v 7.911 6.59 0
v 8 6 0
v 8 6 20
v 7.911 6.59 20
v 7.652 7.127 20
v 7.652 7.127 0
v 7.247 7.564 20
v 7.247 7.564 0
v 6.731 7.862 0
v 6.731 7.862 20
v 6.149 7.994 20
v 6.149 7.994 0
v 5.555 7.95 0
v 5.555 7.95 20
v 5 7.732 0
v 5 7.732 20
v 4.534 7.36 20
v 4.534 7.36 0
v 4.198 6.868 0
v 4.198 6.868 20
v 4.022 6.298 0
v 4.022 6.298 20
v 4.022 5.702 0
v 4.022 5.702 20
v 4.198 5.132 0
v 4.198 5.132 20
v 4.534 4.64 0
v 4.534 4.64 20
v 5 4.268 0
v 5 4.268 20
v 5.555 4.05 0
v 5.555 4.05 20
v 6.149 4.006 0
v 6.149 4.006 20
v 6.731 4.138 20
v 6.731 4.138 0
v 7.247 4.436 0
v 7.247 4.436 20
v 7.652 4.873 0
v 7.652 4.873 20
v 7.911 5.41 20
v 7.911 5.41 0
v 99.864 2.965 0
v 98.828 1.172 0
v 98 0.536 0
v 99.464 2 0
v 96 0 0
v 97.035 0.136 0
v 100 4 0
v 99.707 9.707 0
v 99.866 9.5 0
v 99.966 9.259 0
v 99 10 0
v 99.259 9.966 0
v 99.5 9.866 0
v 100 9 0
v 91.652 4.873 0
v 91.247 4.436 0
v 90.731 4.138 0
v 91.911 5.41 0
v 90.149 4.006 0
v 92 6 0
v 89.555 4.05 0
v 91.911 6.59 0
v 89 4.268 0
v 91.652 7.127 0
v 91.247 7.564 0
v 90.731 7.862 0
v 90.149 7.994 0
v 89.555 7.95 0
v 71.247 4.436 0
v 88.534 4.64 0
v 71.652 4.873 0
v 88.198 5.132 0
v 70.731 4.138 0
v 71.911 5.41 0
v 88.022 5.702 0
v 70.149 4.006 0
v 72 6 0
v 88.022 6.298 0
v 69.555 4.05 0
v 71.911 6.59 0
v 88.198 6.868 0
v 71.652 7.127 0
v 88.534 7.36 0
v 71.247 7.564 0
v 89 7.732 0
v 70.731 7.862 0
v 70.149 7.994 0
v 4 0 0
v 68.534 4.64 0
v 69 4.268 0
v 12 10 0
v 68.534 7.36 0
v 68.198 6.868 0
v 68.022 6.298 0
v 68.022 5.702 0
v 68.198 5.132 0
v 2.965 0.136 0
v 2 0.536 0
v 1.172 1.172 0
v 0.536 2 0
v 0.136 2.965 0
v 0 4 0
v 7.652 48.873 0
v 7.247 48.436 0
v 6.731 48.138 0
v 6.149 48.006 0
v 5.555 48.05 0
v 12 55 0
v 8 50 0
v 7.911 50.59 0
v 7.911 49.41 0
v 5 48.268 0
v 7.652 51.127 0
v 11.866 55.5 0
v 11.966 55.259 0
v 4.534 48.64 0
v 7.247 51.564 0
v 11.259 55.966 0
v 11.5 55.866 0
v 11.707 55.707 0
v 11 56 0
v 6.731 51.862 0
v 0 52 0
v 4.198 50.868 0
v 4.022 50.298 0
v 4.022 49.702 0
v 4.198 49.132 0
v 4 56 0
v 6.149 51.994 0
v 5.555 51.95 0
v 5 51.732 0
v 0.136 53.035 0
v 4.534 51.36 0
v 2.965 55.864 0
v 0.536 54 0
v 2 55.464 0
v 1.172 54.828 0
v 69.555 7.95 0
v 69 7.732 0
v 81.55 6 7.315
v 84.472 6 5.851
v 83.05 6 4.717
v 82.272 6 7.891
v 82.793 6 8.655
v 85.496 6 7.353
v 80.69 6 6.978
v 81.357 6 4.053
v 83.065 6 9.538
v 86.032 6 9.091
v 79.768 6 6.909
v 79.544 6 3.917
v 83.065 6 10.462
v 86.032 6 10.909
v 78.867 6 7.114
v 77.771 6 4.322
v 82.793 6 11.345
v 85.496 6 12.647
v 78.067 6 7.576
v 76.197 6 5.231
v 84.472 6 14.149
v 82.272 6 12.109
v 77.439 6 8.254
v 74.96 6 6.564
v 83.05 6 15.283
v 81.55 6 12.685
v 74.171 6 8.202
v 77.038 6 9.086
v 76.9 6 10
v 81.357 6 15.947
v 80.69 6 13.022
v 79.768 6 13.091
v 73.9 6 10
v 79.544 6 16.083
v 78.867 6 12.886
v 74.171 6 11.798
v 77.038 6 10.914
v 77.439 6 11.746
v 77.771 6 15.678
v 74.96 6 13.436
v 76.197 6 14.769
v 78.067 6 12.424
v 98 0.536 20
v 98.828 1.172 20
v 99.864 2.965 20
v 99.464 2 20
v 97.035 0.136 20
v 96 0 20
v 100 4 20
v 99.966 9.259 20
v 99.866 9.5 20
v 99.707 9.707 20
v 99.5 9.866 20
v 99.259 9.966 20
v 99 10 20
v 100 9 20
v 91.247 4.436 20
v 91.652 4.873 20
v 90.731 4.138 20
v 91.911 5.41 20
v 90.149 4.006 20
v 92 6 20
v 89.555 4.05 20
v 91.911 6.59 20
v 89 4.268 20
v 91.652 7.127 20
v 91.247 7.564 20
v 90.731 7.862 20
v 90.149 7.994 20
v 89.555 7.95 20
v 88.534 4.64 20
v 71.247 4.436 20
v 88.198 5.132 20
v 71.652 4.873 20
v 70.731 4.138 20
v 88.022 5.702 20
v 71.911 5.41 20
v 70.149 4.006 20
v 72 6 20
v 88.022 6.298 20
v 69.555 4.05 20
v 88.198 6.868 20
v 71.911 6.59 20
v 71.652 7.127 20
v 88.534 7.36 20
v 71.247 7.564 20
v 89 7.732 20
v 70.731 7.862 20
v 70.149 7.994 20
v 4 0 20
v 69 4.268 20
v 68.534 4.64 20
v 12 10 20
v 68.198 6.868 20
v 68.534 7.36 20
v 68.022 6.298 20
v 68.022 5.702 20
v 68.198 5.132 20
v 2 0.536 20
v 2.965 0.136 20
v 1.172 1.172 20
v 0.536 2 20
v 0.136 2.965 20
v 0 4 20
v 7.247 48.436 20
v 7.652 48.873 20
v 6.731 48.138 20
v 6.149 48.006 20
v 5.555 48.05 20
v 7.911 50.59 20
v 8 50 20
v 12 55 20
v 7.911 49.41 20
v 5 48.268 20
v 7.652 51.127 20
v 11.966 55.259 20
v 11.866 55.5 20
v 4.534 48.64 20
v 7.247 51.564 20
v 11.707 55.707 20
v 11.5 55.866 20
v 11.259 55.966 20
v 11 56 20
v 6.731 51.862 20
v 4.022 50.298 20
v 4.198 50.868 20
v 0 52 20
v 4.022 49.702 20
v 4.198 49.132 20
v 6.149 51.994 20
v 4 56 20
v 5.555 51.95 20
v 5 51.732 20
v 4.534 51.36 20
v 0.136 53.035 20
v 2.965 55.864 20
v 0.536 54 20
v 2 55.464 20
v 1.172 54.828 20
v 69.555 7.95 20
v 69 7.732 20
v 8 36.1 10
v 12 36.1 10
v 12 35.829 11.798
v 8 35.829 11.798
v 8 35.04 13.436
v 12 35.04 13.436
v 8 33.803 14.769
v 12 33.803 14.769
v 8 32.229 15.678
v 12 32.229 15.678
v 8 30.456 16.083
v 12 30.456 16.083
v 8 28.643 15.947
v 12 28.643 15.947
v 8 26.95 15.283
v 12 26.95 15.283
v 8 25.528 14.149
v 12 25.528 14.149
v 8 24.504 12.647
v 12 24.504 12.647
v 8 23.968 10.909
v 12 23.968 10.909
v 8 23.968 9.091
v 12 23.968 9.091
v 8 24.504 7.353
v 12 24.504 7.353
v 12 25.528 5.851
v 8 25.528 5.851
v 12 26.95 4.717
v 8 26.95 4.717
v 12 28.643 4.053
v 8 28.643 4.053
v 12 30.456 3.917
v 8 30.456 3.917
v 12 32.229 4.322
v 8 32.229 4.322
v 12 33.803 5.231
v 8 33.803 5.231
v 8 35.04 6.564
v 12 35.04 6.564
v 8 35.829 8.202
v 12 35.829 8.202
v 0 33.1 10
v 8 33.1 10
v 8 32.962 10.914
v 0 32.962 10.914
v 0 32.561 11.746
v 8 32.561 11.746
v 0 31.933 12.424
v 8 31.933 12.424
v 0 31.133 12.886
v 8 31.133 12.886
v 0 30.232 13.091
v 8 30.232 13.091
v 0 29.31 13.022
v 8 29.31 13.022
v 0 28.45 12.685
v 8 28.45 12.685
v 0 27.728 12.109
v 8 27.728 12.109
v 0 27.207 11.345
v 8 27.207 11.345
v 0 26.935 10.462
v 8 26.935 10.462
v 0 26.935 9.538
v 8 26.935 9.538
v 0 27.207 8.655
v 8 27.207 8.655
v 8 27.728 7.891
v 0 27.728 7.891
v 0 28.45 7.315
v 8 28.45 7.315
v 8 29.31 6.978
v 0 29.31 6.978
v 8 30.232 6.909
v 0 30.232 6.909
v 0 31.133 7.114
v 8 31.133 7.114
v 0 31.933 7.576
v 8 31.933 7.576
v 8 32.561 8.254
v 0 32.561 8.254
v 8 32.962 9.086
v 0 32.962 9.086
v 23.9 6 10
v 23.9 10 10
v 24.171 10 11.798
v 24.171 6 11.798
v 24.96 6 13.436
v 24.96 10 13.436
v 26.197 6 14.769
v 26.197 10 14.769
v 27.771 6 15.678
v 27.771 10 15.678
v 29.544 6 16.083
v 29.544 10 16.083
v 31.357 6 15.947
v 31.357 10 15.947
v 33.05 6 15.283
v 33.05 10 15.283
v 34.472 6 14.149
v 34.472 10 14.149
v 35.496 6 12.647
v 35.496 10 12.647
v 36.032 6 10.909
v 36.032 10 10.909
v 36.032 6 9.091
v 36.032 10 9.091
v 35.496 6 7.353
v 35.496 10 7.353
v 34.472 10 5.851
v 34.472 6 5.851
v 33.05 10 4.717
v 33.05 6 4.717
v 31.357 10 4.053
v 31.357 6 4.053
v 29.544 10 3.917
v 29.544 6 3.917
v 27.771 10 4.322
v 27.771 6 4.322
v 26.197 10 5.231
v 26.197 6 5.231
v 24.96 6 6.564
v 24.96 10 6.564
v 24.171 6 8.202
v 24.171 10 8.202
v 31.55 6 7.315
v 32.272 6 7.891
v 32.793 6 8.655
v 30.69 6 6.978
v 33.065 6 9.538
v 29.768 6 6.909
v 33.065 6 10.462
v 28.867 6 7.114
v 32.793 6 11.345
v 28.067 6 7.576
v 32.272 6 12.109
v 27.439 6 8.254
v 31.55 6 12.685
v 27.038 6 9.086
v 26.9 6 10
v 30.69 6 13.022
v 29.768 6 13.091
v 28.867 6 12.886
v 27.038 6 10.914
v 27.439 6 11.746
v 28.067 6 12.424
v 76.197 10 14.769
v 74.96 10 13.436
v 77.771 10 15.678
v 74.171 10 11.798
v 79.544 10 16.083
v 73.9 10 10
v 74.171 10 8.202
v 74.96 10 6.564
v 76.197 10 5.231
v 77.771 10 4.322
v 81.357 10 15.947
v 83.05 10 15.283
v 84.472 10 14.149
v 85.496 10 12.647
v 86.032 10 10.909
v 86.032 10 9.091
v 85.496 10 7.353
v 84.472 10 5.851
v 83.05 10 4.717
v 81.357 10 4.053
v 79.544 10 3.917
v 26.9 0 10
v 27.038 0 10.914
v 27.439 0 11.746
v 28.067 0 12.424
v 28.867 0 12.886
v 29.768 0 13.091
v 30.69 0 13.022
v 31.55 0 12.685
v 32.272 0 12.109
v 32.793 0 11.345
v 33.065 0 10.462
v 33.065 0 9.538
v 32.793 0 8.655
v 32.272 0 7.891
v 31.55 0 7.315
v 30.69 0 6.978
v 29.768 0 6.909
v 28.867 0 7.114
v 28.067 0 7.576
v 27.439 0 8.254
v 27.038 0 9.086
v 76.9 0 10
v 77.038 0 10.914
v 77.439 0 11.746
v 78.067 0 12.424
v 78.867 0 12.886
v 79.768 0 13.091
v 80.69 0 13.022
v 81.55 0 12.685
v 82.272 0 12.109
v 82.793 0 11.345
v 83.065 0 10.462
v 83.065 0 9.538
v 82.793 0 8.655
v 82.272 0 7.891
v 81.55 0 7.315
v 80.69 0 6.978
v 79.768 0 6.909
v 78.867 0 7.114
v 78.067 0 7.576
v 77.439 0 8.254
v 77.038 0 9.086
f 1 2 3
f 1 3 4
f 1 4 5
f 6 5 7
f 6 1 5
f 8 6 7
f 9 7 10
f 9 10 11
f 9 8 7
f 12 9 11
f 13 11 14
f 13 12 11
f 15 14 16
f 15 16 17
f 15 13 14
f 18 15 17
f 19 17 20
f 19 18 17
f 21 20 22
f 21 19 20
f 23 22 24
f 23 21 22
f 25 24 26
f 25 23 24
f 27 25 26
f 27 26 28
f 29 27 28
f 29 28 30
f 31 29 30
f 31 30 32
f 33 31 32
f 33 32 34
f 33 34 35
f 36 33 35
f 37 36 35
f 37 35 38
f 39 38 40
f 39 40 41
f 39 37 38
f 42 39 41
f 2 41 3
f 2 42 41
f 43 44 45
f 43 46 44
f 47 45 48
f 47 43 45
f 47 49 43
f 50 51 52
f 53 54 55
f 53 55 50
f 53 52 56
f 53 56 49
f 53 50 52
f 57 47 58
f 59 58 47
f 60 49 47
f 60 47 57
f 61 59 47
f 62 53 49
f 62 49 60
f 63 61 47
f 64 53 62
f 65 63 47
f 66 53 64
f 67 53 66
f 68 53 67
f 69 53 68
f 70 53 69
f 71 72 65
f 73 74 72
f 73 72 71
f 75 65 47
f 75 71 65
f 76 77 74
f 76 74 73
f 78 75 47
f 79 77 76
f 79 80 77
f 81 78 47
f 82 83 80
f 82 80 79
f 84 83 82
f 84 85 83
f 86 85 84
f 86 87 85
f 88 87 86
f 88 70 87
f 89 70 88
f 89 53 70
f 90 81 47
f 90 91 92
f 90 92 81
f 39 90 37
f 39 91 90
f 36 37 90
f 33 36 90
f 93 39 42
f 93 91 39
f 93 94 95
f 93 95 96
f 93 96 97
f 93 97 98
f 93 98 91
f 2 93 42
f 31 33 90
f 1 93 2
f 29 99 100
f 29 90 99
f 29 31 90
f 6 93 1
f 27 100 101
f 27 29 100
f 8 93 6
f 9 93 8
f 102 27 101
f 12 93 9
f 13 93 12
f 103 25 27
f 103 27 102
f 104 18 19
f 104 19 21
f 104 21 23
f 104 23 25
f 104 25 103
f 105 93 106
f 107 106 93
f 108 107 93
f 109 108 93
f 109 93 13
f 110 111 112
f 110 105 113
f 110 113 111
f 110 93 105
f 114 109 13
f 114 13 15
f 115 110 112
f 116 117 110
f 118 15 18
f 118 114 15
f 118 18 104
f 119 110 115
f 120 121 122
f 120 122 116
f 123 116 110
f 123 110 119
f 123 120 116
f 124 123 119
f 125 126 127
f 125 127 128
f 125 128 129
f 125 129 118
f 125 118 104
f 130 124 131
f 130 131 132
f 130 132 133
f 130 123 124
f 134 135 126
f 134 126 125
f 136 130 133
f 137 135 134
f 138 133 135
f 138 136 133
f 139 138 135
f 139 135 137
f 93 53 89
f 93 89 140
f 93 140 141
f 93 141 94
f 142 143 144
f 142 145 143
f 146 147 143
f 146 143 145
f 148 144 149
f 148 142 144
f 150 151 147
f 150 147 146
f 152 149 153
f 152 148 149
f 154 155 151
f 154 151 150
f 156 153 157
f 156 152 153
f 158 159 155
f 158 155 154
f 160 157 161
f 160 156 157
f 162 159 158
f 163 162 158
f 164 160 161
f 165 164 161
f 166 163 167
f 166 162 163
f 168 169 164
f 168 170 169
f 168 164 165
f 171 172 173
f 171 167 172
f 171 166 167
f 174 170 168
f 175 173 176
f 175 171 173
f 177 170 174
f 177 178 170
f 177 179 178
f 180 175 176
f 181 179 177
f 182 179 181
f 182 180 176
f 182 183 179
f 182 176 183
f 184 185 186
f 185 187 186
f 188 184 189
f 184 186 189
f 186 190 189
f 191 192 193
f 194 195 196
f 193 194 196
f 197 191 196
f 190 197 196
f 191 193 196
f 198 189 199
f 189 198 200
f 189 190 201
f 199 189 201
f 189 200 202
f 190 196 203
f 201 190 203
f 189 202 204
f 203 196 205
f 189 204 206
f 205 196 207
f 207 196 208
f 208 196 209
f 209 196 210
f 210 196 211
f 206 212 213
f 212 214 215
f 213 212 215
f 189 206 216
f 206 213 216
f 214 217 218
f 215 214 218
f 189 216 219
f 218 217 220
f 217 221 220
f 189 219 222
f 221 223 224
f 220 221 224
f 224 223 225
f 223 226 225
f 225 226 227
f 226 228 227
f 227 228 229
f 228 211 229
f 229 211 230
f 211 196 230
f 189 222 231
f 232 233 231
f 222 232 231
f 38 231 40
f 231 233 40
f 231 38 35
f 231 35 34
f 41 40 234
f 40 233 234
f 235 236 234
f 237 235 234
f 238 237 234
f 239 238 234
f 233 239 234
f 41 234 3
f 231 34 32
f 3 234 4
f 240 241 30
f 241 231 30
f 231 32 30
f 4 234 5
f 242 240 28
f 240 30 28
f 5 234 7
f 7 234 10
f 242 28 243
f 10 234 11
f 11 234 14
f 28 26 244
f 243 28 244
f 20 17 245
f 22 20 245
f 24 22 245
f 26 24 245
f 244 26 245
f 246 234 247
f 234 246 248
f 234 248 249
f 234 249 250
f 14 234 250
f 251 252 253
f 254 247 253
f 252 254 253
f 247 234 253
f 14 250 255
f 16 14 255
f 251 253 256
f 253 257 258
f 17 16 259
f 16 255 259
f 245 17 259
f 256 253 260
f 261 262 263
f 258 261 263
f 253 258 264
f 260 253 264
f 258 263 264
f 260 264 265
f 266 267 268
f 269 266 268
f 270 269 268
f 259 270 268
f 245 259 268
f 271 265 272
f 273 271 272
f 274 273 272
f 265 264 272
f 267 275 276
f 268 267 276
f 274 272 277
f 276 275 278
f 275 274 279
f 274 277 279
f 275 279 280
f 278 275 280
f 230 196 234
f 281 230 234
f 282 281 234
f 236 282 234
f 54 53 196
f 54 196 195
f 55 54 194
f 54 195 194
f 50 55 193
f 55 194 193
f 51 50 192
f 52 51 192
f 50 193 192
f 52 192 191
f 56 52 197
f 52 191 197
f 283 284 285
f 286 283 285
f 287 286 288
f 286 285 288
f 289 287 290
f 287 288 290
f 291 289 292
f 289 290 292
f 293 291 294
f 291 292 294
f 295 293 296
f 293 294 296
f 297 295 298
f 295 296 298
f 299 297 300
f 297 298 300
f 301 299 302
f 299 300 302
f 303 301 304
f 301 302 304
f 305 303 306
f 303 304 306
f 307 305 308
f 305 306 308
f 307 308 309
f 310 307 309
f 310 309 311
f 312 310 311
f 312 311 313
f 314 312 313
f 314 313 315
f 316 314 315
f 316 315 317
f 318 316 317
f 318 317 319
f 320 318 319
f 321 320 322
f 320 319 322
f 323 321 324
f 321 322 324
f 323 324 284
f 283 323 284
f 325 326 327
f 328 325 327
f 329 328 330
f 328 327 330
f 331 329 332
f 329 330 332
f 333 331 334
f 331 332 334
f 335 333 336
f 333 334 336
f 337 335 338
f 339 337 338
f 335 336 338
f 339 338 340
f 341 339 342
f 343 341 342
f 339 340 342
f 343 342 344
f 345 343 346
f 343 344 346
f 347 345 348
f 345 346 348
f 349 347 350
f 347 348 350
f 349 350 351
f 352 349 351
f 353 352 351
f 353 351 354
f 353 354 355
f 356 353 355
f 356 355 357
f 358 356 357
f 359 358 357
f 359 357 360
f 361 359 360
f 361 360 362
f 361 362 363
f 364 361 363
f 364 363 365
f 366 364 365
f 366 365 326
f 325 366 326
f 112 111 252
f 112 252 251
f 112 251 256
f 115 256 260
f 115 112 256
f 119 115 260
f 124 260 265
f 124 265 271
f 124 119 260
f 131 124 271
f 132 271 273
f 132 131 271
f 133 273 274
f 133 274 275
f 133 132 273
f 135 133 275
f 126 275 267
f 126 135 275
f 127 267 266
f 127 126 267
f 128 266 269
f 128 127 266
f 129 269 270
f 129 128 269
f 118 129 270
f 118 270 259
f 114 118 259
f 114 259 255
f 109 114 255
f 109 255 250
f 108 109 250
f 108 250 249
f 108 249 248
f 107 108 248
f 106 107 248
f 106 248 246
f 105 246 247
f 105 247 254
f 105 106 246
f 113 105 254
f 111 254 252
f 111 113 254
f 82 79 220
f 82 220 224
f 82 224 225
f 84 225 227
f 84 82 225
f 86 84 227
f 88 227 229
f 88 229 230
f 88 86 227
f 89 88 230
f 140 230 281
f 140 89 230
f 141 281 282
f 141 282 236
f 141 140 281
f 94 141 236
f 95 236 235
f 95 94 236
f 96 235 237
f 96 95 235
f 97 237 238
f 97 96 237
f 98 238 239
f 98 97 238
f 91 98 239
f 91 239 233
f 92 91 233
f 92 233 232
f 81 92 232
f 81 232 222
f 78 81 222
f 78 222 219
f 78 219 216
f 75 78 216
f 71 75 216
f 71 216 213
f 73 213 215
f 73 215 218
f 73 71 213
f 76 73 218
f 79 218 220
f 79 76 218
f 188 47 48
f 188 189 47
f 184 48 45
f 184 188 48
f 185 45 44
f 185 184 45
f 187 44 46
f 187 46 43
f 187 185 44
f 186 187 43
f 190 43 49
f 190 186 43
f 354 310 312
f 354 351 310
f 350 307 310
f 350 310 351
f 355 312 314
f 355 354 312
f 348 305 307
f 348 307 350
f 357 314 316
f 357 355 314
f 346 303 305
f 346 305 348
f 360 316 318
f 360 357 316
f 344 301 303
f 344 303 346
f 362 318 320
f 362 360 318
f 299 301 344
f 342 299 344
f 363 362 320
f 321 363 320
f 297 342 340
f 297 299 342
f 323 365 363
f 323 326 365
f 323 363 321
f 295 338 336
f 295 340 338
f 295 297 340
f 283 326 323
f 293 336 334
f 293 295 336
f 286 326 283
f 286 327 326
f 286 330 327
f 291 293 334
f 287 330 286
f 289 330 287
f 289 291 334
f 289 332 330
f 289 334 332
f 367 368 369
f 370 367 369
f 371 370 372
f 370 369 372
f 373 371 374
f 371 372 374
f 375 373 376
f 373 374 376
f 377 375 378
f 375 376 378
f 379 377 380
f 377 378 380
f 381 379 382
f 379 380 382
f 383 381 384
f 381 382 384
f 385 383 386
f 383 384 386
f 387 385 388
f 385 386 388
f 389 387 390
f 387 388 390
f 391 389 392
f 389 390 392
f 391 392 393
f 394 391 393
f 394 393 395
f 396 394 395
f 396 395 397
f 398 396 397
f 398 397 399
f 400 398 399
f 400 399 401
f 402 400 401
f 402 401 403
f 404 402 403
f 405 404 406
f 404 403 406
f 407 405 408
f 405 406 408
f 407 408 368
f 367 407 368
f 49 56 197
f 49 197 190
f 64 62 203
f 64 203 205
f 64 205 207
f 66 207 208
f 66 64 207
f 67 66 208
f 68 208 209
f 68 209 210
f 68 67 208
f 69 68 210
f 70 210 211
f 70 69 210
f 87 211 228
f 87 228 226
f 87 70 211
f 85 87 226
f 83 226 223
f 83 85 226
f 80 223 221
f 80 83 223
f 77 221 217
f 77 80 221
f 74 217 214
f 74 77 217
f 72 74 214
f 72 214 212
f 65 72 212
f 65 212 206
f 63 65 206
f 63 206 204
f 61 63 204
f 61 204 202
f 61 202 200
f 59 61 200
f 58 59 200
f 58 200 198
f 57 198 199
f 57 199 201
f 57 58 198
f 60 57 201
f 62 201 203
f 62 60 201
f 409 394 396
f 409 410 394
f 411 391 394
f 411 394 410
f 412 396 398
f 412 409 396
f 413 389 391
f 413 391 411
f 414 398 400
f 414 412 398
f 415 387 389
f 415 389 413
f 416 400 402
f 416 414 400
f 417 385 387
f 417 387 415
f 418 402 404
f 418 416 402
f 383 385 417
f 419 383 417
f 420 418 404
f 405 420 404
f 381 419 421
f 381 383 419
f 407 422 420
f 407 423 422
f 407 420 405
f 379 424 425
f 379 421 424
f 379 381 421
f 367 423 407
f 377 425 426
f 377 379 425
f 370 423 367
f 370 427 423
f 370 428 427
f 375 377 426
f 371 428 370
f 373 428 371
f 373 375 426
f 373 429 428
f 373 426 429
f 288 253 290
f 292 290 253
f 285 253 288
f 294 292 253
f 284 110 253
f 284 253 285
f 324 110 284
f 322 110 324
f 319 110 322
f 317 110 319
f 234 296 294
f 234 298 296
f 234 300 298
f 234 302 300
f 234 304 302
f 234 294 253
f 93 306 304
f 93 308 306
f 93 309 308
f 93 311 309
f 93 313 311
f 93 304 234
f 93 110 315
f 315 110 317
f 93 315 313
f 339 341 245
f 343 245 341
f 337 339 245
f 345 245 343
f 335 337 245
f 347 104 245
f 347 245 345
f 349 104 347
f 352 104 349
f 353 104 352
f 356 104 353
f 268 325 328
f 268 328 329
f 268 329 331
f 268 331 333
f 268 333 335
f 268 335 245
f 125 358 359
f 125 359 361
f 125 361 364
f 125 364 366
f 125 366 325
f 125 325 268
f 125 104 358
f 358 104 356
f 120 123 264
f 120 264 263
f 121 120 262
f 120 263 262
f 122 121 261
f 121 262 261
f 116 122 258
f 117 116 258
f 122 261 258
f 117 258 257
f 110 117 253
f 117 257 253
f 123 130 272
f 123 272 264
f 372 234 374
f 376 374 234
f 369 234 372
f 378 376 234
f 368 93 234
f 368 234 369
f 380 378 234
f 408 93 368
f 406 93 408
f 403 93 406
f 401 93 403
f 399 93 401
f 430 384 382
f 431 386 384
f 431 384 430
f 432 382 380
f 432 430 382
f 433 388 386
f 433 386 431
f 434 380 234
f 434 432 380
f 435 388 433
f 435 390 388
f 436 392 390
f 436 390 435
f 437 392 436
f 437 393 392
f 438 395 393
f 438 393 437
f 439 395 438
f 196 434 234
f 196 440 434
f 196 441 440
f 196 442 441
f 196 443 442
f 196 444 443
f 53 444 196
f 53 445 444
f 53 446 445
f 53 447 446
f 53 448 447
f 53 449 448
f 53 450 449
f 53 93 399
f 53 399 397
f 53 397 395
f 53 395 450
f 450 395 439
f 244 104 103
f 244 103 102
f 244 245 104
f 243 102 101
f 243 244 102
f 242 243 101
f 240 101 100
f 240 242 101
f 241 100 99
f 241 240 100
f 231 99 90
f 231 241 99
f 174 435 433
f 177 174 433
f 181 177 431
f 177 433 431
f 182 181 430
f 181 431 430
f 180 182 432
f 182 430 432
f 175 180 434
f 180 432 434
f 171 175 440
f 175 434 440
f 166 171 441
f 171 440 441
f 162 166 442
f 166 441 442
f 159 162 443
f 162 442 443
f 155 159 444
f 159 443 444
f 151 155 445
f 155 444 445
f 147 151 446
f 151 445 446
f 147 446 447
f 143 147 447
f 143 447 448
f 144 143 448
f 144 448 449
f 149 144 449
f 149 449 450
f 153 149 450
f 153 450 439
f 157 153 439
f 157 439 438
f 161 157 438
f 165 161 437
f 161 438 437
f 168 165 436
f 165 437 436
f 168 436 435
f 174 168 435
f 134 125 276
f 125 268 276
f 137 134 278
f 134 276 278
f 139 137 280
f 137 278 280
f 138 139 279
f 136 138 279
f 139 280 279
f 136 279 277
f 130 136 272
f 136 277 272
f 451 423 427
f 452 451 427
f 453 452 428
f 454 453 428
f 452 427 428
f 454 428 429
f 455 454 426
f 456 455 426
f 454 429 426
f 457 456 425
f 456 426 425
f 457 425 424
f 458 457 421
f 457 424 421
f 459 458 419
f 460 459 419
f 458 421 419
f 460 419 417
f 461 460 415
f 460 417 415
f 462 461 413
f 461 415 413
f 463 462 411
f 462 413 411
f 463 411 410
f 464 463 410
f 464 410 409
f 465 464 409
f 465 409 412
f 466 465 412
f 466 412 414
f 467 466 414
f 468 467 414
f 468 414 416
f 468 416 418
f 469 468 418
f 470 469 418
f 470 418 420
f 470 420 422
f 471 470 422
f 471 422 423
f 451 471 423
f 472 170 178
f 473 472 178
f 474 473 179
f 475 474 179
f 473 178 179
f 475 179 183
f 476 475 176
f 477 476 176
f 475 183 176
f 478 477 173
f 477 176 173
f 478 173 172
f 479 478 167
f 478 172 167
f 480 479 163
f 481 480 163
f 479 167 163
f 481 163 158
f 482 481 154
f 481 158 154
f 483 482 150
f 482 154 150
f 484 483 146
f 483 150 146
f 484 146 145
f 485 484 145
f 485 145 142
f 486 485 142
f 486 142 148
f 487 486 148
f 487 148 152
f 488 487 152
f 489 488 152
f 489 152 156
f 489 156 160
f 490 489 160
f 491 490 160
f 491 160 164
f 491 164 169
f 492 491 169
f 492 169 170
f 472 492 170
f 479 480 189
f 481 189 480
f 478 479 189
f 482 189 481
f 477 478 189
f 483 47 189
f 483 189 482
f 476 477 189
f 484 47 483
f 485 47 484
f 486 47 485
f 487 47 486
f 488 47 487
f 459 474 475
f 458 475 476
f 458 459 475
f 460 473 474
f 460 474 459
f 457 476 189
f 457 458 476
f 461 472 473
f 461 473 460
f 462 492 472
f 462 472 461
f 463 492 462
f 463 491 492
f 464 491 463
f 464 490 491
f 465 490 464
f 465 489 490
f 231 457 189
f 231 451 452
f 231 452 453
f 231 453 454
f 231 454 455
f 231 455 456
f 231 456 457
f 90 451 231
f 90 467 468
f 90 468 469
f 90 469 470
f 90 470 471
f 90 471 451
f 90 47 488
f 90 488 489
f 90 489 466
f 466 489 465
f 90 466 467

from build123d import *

# Parameters (mm, degrees)
SKETCH_R        = 2
PAD_DEPTH       = 20
SKETCH001_R     = 6.1
POCKET_DEPTH    = 4
SKETCH002_R     = 6.1
POCKET001_DEPTH = 4
SKETCH003_R     = 3.1
POCKET002_DEPTH = 10
SKETCH004_R     = 3.1
POCKET003_DEPTH = 10
FILLET_R        = 4
FILLET001_R     = 4
FILLET002_R     = 4
FILLET003_R     = 1
FILLET004_R     = 1


with BuildPart() as part:
    # Sketch → Pad (new body)
    with BuildSketch(Plane.XY):
        Polygon((0, 56), (12, 56), (12, 10), (100, 10), (100, 0), (0, 0), align=None)
        with Locations((6, 50)):
            Circle(SKETCH_R, mode=Mode.SUBTRACT)
        with Locations((6, 6)):
            Circle(SKETCH_R, mode=Mode.SUBTRACT)
        with Locations((90, 6)):
            Circle(SKETCH_R, mode=Mode.SUBTRACT)
        with Locations((70, 6)):
            Circle(SKETCH_R, mode=Mode.SUBTRACT)
    extrude(amount=PAD_DEPTH)

    # Sketch001 → Pocket (cut)
    with BuildSketch(Plane(origin=(0, 10, 0), x_dir=(-1, 0, 0), z_dir=(0, 1, 0))):
        with Locations((-30, 10)):
            Circle(SKETCH001_R)
        with Locations((-80, 10)):
            Circle(SKETCH001_R)
    extrude(amount=-POCKET_DEPTH, mode=Mode.SUBTRACT)

    # Sketch002 → Pocket001 (cut)
    with BuildSketch(Plane.YZ.offset(12)):
        with Locations((30, 10)):
            Circle(SKETCH002_R)
    extrude(amount=-POCKET001_DEPTH, mode=Mode.SUBTRACT)

    # Sketch003 → Pocket002 (cut)
    with BuildSketch(Plane.YZ.offset(8)):
        with Locations((30, 10)):
            Circle(SKETCH003_R)
    extrude(amount=-POCKET002_DEPTH, mode=Mode.SUBTRACT)

    # Sketch004 → Pocket003 (cut)
    with BuildSketch(Plane(origin=(0, 6, 0), x_dir=(-1, 0, 0), z_dir=(0, 1, 0))):
        with Locations((-80, 10)):
            Circle(SKETCH004_R)
        with Locations((-30, 10)):
            Circle(SKETCH004_R)
    extrude(amount=-POCKET003_DEPTH, mode=Mode.SUBTRACT)

    # Fillet
    fillet_edges = [part.edges().sort_by_distance(p)[0] for p in [
        (0, 0, 10),
    ]]
    fillet(fillet_edges, radius=FILLET_R)

    # Fillet001
    fillet001_edges = [part.edges().sort_by_distance(p)[0] for p in [
        (100, 0, 10),
    ]]
    fillet(fillet001_edges, radius=FILLET001_R)

    # Fillet002
    fillet002_edges = [part.edges().sort_by_distance(p)[0] for p in [
        (0, 56, 10),
    ]]
    fillet(fillet002_edges, radius=FILLET002_R)

    # Fillet003
    fillet003_edges = [part.edges().sort_by_distance(p)[0] for p in [
        (12, 56, 10),
    ]]
    fillet(fillet003_edges, radius=FILLET003_R)

    # Fillet004
    fillet004_edges = [part.edges().sort_by_distance(p)[0] for p in [
        (100, 10, 10),
    ]]
    fillet(fillet004_edges, radius=FILLET004_R)


solid = part.part
